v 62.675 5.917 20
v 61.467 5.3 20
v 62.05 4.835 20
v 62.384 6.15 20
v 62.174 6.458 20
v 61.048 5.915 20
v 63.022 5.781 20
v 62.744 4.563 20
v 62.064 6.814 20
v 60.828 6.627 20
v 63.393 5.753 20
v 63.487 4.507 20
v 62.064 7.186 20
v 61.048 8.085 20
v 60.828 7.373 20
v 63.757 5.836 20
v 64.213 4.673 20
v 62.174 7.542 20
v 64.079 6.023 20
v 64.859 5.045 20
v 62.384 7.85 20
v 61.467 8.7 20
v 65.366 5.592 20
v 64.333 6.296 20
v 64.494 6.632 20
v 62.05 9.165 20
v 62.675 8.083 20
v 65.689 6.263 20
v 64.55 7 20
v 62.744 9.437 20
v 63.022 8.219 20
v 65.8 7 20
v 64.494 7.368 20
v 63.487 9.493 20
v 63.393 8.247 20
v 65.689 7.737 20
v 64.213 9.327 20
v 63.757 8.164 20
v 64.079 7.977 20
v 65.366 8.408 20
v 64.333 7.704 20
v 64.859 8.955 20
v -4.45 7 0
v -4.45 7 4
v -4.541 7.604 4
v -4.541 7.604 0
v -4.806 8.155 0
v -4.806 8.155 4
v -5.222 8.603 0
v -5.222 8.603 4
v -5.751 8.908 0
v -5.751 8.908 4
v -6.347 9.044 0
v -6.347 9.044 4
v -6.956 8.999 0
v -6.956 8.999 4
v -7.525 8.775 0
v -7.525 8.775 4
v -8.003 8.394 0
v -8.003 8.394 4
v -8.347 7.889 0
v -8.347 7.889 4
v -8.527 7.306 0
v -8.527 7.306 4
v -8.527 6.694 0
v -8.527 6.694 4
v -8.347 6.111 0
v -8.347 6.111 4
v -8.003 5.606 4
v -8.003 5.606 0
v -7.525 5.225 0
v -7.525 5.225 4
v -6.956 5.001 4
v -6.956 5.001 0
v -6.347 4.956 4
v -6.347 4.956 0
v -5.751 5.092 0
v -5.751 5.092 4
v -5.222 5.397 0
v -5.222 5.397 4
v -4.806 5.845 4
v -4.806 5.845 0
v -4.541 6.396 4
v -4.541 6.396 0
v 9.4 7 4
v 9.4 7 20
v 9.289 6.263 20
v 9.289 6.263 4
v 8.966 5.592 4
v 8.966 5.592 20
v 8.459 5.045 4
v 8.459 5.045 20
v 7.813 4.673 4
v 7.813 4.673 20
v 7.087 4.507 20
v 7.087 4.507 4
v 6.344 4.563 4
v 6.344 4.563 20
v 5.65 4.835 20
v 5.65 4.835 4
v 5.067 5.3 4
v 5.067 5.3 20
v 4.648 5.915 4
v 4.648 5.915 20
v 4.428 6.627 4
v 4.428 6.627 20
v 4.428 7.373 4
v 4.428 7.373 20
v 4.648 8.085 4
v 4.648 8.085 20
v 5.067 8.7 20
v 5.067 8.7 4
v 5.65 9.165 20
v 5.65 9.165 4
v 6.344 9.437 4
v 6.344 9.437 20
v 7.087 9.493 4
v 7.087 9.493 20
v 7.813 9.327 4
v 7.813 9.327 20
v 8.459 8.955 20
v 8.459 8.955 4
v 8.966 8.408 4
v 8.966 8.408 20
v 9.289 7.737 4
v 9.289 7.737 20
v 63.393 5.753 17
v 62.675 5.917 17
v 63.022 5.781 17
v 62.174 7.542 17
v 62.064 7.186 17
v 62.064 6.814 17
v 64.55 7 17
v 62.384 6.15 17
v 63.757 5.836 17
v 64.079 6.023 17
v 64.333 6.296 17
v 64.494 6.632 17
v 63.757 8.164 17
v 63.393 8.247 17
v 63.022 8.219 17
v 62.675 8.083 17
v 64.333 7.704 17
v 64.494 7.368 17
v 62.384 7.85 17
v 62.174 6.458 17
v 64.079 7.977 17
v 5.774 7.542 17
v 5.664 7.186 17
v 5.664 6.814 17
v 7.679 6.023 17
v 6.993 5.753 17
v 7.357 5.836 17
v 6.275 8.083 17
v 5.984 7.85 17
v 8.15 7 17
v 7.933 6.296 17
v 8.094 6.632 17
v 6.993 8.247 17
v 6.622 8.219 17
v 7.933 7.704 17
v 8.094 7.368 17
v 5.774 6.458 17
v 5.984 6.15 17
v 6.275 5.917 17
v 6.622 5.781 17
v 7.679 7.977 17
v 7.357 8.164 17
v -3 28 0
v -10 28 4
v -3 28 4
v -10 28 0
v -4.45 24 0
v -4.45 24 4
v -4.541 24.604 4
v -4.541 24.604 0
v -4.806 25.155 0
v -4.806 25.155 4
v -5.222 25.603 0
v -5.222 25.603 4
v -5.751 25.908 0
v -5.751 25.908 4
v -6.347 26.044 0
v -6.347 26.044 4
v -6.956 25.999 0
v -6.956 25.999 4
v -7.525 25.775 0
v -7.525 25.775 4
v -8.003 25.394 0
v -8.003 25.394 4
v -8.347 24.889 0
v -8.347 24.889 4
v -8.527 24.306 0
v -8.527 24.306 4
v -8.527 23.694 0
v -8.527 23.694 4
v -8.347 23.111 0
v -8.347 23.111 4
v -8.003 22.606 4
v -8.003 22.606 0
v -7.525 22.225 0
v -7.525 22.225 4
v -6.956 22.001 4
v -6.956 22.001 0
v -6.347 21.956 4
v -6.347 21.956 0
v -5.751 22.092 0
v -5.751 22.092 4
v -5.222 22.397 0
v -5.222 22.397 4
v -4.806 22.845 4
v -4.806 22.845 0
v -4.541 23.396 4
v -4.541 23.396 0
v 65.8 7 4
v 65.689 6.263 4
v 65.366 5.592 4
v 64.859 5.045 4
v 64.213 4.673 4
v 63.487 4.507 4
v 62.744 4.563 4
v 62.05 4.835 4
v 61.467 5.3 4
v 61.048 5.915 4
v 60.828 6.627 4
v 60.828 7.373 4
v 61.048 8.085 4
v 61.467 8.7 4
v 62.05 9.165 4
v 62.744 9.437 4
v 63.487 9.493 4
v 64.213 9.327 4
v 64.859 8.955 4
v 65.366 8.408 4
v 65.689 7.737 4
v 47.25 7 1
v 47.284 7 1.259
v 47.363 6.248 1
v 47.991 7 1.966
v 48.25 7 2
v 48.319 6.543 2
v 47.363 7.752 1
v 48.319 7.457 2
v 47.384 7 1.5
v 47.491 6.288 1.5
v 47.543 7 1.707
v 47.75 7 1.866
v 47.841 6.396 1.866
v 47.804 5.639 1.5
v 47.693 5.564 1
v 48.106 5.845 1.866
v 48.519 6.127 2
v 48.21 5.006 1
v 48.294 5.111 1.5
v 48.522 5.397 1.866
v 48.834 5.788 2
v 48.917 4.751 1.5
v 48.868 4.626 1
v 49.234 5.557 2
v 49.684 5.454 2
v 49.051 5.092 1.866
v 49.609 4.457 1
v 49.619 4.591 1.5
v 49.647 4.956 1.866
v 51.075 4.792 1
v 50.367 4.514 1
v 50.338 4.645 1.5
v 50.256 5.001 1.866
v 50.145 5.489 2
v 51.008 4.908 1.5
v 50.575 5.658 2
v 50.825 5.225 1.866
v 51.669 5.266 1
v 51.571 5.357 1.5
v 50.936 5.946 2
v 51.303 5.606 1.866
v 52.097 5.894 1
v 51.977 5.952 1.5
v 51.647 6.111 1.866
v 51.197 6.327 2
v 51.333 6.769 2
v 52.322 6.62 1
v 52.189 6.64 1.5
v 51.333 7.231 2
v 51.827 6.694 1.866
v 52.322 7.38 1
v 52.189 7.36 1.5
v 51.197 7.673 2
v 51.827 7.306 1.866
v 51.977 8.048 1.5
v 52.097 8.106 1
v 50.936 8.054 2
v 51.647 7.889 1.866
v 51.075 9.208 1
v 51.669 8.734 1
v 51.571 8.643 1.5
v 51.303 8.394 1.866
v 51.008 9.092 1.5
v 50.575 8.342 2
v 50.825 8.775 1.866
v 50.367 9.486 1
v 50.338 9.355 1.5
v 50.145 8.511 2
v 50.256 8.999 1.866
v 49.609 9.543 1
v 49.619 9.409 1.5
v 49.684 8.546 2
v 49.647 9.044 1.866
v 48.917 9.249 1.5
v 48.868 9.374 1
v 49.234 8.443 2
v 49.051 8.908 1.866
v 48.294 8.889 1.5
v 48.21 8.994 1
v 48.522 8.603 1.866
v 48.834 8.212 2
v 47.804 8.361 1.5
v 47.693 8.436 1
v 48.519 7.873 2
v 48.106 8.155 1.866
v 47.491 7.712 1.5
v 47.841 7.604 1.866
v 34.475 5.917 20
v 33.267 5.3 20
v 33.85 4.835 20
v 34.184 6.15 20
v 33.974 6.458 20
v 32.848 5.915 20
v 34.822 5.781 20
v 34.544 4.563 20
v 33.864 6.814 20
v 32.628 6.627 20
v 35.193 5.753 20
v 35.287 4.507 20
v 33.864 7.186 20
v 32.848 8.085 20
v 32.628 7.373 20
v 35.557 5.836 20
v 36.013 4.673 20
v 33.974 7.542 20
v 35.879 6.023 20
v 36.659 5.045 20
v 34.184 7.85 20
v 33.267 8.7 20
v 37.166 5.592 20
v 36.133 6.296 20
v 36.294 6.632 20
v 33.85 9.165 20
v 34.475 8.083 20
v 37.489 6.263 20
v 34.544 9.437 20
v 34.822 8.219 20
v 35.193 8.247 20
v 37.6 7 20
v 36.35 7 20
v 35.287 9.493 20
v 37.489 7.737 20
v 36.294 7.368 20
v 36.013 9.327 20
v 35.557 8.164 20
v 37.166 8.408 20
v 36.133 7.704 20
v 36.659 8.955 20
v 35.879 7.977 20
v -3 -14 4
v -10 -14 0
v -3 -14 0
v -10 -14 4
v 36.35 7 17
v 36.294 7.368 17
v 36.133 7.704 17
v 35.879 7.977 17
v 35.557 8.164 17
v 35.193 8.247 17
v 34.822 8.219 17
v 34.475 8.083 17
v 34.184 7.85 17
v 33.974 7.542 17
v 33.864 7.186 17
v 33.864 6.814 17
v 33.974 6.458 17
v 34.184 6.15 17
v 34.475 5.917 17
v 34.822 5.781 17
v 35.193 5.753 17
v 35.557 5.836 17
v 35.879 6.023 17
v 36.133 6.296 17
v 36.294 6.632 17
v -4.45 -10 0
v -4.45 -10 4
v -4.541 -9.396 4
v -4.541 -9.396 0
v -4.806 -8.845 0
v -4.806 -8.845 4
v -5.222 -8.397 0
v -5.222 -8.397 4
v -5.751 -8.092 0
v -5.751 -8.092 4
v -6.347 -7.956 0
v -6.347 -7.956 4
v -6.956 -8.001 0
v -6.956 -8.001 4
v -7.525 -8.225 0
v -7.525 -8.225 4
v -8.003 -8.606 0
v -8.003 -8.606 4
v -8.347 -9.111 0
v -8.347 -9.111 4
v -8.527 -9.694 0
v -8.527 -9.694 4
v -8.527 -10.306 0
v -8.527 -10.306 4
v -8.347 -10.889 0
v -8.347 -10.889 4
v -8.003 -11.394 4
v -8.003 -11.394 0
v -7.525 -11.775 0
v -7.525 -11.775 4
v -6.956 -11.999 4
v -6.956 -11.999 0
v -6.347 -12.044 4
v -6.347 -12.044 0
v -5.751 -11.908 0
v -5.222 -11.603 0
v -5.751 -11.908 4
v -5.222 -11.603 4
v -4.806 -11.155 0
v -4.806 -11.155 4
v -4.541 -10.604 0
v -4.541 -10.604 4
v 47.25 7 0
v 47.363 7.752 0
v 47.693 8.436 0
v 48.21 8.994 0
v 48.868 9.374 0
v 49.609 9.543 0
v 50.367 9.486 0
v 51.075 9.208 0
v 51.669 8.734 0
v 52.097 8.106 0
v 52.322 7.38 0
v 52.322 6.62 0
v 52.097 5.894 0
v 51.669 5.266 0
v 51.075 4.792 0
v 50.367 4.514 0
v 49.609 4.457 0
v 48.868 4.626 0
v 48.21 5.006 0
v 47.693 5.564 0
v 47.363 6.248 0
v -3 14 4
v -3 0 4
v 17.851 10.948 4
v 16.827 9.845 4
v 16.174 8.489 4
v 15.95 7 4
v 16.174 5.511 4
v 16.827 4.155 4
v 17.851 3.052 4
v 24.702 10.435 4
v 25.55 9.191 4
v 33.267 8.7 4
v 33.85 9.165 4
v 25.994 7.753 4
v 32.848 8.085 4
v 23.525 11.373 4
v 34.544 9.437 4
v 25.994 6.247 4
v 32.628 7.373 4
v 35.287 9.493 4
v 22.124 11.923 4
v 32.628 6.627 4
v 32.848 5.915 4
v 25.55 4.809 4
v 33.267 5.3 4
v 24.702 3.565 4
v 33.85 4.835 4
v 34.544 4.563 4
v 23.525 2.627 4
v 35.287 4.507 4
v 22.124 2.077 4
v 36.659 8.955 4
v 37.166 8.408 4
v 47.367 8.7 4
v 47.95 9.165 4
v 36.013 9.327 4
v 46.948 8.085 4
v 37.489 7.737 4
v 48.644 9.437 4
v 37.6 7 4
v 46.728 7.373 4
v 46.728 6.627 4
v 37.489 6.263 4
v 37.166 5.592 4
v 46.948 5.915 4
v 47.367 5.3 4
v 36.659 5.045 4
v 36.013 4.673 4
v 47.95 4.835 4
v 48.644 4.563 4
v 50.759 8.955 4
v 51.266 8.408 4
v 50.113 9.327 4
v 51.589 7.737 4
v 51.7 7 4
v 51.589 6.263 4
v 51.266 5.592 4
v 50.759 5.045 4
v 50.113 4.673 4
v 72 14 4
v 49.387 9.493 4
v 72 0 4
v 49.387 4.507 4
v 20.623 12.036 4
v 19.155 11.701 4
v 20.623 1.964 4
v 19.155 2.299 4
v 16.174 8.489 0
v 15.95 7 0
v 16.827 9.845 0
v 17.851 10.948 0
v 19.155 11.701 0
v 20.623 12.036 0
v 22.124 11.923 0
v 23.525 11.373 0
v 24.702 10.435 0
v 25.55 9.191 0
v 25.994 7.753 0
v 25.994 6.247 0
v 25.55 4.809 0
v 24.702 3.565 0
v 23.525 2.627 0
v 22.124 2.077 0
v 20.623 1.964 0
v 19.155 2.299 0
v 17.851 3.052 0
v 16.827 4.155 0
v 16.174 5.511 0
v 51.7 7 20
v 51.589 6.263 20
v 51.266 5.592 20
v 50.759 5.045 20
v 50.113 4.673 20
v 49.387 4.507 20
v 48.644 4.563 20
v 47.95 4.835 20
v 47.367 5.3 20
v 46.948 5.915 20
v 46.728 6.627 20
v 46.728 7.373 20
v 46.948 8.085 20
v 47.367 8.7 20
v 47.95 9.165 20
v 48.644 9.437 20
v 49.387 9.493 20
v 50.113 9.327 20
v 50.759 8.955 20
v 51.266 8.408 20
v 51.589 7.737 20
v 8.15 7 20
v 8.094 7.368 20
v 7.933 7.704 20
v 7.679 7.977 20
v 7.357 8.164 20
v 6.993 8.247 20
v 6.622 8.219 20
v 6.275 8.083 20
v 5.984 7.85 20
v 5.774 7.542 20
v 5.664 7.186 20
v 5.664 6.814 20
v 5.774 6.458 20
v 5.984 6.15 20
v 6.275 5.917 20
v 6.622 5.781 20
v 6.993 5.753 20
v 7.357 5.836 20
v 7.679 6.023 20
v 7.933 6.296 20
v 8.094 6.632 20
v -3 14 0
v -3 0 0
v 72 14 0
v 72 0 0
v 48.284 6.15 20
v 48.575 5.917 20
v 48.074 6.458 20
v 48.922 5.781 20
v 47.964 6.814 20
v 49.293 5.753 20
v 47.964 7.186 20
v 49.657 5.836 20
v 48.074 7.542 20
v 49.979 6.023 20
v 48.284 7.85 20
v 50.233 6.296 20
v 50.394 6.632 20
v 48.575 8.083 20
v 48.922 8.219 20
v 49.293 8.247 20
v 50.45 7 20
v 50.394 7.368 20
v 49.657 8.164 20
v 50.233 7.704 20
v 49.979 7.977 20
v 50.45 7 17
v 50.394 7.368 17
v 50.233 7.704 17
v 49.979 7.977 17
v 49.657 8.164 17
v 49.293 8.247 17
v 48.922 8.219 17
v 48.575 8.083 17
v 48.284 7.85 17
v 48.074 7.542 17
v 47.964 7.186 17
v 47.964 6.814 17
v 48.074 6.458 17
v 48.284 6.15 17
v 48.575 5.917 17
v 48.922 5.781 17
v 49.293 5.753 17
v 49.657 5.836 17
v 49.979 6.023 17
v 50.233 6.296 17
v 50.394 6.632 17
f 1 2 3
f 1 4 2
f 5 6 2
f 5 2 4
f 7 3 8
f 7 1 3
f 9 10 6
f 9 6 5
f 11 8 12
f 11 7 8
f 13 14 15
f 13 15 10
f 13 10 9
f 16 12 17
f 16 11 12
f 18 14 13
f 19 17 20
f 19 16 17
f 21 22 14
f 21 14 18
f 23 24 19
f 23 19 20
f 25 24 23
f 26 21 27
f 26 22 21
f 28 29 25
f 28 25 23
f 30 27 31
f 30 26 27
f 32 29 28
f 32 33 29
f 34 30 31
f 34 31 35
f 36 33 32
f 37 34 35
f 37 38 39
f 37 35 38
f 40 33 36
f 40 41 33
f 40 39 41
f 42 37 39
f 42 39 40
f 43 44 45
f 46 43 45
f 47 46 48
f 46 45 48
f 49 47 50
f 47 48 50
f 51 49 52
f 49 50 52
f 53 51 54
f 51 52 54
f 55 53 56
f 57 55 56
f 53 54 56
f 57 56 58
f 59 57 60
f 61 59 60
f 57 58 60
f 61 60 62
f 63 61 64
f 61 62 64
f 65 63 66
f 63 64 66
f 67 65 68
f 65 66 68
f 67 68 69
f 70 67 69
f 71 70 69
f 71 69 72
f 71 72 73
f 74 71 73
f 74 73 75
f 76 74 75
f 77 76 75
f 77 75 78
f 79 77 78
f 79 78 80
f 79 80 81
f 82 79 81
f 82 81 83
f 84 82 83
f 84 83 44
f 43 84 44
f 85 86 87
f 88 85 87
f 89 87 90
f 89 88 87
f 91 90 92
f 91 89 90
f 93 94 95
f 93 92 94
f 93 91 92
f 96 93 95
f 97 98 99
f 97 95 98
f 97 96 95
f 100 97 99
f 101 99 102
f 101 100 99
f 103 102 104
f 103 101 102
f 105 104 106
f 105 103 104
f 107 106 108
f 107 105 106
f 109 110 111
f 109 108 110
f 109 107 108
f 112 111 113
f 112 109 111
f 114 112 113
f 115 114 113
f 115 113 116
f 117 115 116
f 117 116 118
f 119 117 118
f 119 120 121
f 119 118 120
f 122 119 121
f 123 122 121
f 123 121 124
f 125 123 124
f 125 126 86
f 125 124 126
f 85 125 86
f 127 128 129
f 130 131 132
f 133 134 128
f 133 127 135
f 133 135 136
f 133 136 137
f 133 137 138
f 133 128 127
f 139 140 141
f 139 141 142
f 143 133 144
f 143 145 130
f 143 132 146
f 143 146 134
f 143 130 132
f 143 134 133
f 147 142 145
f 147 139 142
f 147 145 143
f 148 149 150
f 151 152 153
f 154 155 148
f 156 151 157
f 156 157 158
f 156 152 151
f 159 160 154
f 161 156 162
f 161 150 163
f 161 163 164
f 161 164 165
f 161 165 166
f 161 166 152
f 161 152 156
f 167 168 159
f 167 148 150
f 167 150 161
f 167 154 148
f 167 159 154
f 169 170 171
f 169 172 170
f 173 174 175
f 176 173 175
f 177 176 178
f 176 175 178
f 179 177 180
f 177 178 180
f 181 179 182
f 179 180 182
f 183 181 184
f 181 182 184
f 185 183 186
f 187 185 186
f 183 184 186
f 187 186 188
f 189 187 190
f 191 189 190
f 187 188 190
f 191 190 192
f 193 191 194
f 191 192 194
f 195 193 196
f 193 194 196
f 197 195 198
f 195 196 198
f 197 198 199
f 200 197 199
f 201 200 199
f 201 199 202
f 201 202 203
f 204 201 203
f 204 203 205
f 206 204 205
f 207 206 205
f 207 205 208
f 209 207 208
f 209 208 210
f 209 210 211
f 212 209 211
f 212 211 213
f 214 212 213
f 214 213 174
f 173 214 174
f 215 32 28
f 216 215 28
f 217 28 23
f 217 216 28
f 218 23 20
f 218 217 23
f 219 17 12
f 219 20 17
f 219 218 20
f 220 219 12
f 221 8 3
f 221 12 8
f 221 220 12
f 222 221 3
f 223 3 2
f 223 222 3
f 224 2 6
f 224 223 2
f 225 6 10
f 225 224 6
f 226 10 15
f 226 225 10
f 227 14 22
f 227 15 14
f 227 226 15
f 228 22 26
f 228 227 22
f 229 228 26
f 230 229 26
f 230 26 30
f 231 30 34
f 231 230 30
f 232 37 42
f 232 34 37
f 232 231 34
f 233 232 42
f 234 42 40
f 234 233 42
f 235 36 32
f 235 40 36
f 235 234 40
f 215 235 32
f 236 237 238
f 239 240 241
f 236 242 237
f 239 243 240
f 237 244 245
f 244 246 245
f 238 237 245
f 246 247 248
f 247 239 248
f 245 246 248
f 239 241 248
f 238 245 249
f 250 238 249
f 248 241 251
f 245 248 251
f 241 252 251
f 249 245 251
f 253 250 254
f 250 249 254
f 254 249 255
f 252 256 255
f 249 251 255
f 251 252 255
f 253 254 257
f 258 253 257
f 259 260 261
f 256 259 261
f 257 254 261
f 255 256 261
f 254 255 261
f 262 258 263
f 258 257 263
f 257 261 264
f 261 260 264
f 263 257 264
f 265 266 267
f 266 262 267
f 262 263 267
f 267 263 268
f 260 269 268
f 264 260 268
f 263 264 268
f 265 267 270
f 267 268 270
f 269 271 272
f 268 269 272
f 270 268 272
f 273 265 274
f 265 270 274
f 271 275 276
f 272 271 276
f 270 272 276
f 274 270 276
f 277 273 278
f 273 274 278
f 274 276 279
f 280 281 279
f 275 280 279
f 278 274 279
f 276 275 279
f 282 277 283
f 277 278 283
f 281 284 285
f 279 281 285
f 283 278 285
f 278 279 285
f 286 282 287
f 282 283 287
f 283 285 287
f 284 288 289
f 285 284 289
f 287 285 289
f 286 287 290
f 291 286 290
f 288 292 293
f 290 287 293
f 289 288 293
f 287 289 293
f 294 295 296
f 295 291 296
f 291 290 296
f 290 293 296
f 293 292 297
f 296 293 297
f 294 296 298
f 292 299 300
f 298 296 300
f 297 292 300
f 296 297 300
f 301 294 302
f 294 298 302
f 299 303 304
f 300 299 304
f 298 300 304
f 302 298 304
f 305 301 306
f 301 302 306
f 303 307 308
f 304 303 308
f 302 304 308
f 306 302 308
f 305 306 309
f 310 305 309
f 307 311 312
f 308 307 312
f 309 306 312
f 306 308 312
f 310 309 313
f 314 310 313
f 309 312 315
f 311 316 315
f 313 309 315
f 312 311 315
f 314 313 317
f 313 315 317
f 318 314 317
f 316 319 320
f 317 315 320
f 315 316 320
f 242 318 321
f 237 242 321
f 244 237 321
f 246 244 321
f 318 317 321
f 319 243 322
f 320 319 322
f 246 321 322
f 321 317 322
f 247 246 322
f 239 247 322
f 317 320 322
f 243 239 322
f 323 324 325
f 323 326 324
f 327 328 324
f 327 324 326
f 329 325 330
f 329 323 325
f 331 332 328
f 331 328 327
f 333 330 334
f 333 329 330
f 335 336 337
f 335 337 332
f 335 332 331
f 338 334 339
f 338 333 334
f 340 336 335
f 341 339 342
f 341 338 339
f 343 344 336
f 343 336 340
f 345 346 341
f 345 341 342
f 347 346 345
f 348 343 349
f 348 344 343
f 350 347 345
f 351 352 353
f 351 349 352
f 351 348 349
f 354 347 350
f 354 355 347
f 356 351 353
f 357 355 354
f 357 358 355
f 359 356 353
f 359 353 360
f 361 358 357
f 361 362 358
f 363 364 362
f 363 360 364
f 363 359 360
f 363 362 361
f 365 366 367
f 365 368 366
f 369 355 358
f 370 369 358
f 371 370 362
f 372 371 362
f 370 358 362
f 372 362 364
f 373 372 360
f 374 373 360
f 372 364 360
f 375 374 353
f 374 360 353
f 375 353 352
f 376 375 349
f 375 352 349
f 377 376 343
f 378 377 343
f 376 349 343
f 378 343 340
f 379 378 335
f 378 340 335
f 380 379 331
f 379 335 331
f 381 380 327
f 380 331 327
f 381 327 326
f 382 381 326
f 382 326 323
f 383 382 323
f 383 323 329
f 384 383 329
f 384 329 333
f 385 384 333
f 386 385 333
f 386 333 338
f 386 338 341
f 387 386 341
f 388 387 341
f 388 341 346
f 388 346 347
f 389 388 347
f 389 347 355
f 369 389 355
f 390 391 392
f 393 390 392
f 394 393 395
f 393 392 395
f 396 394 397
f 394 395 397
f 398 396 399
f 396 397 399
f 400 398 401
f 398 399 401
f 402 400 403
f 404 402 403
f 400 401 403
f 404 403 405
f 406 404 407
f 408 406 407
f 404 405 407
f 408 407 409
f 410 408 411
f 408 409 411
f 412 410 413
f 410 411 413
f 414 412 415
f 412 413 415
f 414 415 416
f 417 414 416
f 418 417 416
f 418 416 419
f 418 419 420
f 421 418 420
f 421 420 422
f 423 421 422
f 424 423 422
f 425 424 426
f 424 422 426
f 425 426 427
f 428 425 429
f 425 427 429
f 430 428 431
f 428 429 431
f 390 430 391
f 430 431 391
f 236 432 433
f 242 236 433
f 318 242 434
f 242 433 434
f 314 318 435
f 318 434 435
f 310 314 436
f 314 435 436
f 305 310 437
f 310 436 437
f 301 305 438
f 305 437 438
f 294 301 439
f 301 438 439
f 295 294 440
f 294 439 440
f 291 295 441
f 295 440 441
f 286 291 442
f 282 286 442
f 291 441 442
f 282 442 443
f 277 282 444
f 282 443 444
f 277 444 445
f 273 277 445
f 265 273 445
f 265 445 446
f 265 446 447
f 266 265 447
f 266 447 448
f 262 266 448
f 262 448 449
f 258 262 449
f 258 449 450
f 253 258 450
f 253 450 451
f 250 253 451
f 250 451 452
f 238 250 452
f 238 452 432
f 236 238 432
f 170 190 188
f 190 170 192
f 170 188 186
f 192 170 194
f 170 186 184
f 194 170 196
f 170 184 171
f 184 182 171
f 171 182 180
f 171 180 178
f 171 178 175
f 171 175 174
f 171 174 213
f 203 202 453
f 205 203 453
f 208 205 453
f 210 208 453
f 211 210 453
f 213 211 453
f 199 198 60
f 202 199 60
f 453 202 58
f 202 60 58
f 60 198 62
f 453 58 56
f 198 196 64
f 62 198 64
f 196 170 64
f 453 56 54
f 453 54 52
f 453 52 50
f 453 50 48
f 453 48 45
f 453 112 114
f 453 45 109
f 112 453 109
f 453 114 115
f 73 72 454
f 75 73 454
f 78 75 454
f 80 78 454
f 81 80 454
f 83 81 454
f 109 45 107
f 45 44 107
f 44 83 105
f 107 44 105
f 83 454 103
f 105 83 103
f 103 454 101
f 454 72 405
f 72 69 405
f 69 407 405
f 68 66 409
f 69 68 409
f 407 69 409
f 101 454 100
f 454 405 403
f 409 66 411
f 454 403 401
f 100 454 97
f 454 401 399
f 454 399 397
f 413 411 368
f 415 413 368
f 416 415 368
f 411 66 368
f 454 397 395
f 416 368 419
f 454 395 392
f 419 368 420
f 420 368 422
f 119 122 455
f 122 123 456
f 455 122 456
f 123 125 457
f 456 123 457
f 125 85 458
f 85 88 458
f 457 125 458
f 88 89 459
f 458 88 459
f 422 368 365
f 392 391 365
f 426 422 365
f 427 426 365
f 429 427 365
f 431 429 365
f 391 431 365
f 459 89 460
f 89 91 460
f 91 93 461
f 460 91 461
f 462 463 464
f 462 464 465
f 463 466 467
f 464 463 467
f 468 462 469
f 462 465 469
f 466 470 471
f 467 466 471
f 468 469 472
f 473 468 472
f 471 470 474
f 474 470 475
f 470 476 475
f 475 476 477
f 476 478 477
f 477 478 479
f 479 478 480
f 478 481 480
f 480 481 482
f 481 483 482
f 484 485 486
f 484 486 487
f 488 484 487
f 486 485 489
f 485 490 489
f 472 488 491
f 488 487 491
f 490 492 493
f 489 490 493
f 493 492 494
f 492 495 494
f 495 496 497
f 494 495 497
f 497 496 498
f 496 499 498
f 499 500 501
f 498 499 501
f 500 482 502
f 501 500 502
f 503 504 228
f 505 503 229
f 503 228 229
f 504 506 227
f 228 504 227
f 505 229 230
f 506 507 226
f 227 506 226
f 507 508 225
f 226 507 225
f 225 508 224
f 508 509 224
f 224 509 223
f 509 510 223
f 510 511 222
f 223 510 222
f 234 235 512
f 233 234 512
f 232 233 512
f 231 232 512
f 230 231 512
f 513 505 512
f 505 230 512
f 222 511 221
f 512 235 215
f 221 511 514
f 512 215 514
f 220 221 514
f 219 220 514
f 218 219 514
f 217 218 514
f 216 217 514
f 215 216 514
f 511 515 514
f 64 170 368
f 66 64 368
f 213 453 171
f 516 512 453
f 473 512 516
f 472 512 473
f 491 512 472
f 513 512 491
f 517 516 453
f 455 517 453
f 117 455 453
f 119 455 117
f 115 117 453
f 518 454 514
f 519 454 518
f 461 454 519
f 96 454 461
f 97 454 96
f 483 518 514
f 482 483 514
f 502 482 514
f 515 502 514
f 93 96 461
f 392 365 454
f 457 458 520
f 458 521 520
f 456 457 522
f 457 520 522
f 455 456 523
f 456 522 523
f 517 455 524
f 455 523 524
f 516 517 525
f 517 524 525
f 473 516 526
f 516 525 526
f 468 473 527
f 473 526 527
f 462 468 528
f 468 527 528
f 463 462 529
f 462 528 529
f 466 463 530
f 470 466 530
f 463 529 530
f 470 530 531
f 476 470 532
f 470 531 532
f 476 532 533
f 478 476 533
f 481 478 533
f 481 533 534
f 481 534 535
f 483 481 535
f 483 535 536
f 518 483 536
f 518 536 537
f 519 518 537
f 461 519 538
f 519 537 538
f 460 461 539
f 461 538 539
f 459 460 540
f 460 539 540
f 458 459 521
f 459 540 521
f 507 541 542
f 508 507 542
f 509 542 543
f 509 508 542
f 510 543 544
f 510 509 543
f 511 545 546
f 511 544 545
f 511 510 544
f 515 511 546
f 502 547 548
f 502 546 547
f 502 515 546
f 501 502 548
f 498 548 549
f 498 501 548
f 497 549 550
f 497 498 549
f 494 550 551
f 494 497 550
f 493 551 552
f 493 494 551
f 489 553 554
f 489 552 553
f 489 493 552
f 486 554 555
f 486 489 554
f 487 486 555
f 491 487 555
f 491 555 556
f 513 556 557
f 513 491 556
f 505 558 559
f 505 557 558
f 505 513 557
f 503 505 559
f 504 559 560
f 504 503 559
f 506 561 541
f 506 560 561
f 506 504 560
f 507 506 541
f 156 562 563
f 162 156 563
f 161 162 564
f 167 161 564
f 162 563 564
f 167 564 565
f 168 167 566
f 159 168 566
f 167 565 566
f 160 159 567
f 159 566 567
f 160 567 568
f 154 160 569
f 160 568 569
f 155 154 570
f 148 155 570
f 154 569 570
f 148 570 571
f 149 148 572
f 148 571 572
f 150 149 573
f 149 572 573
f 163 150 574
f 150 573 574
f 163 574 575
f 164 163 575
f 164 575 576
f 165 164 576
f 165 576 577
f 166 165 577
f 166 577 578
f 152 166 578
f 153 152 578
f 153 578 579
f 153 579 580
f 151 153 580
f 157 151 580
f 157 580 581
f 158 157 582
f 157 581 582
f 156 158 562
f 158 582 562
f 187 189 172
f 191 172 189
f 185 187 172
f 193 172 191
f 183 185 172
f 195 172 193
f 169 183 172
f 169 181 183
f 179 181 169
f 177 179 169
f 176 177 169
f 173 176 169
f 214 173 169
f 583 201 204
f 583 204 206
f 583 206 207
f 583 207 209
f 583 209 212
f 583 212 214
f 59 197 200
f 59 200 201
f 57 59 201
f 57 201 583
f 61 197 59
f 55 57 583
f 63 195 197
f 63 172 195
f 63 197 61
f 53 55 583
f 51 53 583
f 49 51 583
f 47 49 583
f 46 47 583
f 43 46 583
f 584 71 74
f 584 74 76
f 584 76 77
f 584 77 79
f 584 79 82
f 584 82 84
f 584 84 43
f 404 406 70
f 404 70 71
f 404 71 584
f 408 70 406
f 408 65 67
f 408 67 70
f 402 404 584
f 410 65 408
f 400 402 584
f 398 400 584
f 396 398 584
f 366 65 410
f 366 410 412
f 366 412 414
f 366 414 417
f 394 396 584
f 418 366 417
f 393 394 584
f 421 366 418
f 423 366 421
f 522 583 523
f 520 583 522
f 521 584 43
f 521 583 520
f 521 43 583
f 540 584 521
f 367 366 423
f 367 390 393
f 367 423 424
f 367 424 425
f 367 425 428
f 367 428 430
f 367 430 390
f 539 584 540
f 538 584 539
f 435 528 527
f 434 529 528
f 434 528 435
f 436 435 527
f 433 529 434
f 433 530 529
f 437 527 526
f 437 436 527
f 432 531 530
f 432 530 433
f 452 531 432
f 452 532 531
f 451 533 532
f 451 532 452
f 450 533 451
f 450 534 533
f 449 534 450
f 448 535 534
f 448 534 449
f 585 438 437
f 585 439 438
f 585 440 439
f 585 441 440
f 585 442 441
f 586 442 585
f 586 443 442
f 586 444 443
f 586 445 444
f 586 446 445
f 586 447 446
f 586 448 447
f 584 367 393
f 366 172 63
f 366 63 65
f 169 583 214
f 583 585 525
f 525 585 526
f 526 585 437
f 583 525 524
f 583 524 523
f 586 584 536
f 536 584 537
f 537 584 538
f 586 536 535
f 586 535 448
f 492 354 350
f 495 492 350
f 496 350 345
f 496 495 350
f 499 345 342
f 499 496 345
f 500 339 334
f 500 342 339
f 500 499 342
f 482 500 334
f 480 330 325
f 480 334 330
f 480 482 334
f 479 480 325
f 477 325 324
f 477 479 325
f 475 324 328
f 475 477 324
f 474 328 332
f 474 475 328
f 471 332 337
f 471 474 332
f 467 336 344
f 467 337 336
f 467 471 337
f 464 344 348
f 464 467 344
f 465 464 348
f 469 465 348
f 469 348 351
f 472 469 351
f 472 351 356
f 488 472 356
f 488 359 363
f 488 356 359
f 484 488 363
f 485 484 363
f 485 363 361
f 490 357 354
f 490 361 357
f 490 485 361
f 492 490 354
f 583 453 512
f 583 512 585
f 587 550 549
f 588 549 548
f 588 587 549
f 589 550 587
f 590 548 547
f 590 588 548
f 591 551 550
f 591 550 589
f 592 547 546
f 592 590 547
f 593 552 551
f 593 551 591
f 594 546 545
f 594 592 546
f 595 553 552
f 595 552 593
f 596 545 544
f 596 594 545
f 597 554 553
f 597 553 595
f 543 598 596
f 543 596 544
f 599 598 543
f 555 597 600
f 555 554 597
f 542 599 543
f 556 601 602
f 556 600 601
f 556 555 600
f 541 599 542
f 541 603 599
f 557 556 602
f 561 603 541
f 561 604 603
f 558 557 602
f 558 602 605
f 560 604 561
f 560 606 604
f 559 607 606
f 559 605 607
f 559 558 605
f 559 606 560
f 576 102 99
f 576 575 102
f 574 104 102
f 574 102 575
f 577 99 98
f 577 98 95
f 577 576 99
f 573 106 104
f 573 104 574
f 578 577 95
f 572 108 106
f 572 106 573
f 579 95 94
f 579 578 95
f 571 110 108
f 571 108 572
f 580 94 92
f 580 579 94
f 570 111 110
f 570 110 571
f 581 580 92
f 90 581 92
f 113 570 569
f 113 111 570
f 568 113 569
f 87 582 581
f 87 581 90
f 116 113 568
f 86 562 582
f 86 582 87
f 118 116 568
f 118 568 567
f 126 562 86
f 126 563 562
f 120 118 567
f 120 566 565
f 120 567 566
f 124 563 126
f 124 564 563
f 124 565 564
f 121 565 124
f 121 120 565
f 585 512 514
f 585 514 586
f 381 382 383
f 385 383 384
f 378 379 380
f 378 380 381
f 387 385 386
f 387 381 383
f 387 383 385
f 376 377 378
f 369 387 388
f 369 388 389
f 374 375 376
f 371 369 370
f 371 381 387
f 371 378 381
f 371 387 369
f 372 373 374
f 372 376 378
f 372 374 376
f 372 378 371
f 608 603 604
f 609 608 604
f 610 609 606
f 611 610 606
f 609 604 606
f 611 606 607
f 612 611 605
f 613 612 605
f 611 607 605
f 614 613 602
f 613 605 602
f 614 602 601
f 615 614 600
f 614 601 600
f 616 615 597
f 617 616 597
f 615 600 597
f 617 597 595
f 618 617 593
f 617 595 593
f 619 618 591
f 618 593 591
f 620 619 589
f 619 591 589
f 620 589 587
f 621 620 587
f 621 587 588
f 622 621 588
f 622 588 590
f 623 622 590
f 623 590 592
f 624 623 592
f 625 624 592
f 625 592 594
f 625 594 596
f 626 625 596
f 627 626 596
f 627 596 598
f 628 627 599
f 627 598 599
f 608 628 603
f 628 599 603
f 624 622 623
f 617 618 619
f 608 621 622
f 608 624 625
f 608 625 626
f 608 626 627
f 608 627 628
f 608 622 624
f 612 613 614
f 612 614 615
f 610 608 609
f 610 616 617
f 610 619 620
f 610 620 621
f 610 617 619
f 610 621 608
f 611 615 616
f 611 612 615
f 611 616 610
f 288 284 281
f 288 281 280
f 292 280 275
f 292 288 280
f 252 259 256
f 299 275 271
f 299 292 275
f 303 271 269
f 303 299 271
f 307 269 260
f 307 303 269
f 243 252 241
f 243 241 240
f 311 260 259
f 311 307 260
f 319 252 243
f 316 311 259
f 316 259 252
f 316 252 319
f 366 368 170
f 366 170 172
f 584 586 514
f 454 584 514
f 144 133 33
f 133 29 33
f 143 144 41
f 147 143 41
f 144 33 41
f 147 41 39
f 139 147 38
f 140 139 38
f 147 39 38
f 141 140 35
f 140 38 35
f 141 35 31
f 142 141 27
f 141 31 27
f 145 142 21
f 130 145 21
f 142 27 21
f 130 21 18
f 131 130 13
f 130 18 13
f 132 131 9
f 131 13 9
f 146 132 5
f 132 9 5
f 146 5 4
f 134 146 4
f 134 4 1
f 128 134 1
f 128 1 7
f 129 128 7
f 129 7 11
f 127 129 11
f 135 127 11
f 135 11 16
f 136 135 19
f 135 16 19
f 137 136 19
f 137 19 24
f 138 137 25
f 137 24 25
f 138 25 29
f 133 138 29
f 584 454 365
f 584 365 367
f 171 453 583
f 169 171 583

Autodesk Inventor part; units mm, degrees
ref_plane "YZ Plane" through (0, 0, 0) normal (1, 0, 0) x (0, 1, 0)
ref_plane "XZ Plane" through (0, 0, 0) normal (0, 1, 0) x (-1, 0, 0)
ref_plane "XY Plane" through (0, 0, 0) normal (0, 0, 1) x (1, 0, 0)
sketch "Sketch1" plane through (0, 0, 0) normal (0, 0, 1) x (1, 0, 0)
  line L0 (0, 0) -> (42, 0)
  line L1 (42, 0) -> (42, 14)
  line L2 (42, 14) -> (0, 14)
  line L3 (0, 14) -> (0, 0)
  dimension "d0" = 42
  dimension "d1" = 14
extrude "Extrusion1" add sketch "Sketch1" along normal blind 4
sketch "Sketch2" plane through (0, 0, 4) normal (0, 0, 1) x (1, 0, 0)
  circle A0 centre (21, 7) radius 2.55
  line L0 (42, 14) -> (0, 14) projected
  line L1 (0, 14) -> (0, 0) projected
  circle A1 centre (6.9, 7) radius 2.5
  circle A2 centre (35.1, 7) radius 2.5
  dimension "d35" = 0
  dimension "d4" = 5.1
  dimension "d5" = 42
  dimension "d6" = 14
  dimension "d7" = 7
  dimension "d8" = 21
  dimension "d9" = 5
  dimension "d10" = 5
  dimension "d11" = 14.1
  dimension "d12" = 14.1
extrude "Extrusion2" add sketch "Sketch2" along normal blind 16 contours A1 | A2
extrude "Extrusion3" cut sketch "Sketch2" against normal blind 4 contours A0
sketch "Sketch3" plane through (6.9, 7, 20) normal (0, 0, 1) x (1, 0, 0)
  circle A0 centre (0, 0) radius 1.25
  circle A1 centre (28.2, 0) radius 2.5 projected
  circle A2 centre (28.2, 0) radius 1.25
  point P0 (-6.9, -7)
  dimension "d19" = 2.5
  dimension "d20" = 2.5
extrude "Extrusion4" cut sketch "Sketch3" against normal blind 3 contours A0 | A2
sketch "Sketch4" plane through (0, 0, 0) normal (0, 0, -1) x (-1, 0, 0)
  circle A0 centre (-21, 7) radius 2.55 projected
  circle A1 centre (-49.8, 7) radius 2.55
  point P0 (0, 0)
  dimension "d23" = 5.1
  dimension "d24" = 28.8
sketch "Sketch5" plane through (42, 0, 0) normal (1, 0, 0) x (0, 0, -1)
  line L0 (0, 0) -> (-4, 0) projected
  line L1 (-4, 14) -> (0, 14)
  line L2 (0, 14) -> (0, 0)
  line L3 (0, 0) -> (-4, 0)
  line L4 (-4, 0) -> (-4, 14)
extrude "Extrusion5" add sketch "Sketch5" along normal blind 30
extrude "Extrusion6" cut sketch "Sketch4" against normal blind 2 contours A1
sketch "Sketch6" plane through (0, 0, 0) normal (0, 0, -1) x (-1, 0, 0)
  circle A0 centre (-21, 7) radius 2.55 projected
  circle A1 centre (-21, 7) radius 5.05
  point P0 (0, 0)
  dimension "d29" = 10.1
extrude "Extrusion7" cut sketch "Sketch6" against normal through all
sketch "Sketch7" plane through (0, 0, 4) normal (0, 0, 1) x (1, 0, 0)
  circle A0 centre (35.1, 7) radius 2.5 projected
  circle A1 centre (49.2, 7) radius 2.5
  point P0 (0, 0)
  dimension "d32" = 5
  dimension "d33" = 14.1
extrude "Extrusion8" add sketch "Sketch7" along normal blind 16 contours A1
fillet "Fillet3" radius 1 1 edges at (52.35, 7, 2)
sketch "Sketch8" plane through (49.2, 7, 20) normal (0, 0, 1) x (1, 0, 0)
  circle A0 centre (0, 0) radius 1.25
  point P0 (-49.2, -7)
  dimension "d37" = 2.5
extrude "Extrusion9" cut sketch "Sketch8" against normal blind 3
pattern_linear "Rectangular Pattern1" count 2 spacing 14.1 along (1, 0, 0) of "Extrusion8", "Extrusion9"
sketch "Sketch9" plane through (0, 0, 0) normal (-1, 0, 0) x (0, 0, 1)
  line L0 (4, 14) -> (4, 0) projected
  line L1 (0, 0) -> (4, 0)
  line L2 (4, 0) -> (4, 14)
  line L3 (4, 14) -> (0, 14)
  line L4 (0, 14) -> (0, 0)
extrude "Extrusion10" add sketch "Sketch9" along normal blind 10
sketch "Sketch10" plane through (72, 0, 0) normal (0, -1, 0) x (1, 0, 0)
  line L0 (0, 4) -> (-82, 4) projected
  line L1 (-82, 0) -> (0, 0) projected
  line L2 (-82, 4) -> (-75, 4)
  line L3 (-75, 4) -> (-75, 0)
  line L4 (-75, 0) -> (-82, 0)
  line L5 (-82, 0) -> (-82, 4)
  point P0 (-72, 0)
  dimension "d46" = 7
extrude "Extrusion11" add sketch "Sketch10" along normal blind 14
sketch "Sketch11" plane through (72, 14, 4) normal (0, 1, 0) x (1, 0, 0)
  line L0 (-82, 0) -> (-82, 4) projected
  line L1 (-82, 4) -> (-75, 4) projected
  line L2 (-82, 0) -> (-75, 0)
  line L3 (-75, 0) -> (-75, 4)
  line L4 (-75, 4) -> (-82, 4)
  line L5 (-82, 4) -> (-82, 0)
  point P0 (-72, 4)
  dimension "d49" = 7
extrude "Extrusion12" add sketch "Sketch11" along normal blind 14
sketch "Sketch12" plane through (0, 0, 4) normal (0, 0, 1) x (1, 0, 0)
  circle A0 centre (-6.5, 24) radius 2.05
  line L0 (-3, 14) -> (-3, 28) projected
  line L1 (-10, 28) -> (-3, 28) projected
  circle A1 centre (-6.5, 7) radius 2.05
  circle A2 centre (-6.5, -10) radius 2.05
  point P0 (0, 0)
  dimension "d52" = 4.1
  dimension "d53" = 3.5
  dimension "d54" = 4
  dimension "d57" = 17
extrude "Extrusion13" cut sketch "Sketch12" against normal through all
equation "\"d7\" = 0.5 * d6"
equation "\"d8\" = 0.5 * d5"
properties part number "Kroller Holder"
